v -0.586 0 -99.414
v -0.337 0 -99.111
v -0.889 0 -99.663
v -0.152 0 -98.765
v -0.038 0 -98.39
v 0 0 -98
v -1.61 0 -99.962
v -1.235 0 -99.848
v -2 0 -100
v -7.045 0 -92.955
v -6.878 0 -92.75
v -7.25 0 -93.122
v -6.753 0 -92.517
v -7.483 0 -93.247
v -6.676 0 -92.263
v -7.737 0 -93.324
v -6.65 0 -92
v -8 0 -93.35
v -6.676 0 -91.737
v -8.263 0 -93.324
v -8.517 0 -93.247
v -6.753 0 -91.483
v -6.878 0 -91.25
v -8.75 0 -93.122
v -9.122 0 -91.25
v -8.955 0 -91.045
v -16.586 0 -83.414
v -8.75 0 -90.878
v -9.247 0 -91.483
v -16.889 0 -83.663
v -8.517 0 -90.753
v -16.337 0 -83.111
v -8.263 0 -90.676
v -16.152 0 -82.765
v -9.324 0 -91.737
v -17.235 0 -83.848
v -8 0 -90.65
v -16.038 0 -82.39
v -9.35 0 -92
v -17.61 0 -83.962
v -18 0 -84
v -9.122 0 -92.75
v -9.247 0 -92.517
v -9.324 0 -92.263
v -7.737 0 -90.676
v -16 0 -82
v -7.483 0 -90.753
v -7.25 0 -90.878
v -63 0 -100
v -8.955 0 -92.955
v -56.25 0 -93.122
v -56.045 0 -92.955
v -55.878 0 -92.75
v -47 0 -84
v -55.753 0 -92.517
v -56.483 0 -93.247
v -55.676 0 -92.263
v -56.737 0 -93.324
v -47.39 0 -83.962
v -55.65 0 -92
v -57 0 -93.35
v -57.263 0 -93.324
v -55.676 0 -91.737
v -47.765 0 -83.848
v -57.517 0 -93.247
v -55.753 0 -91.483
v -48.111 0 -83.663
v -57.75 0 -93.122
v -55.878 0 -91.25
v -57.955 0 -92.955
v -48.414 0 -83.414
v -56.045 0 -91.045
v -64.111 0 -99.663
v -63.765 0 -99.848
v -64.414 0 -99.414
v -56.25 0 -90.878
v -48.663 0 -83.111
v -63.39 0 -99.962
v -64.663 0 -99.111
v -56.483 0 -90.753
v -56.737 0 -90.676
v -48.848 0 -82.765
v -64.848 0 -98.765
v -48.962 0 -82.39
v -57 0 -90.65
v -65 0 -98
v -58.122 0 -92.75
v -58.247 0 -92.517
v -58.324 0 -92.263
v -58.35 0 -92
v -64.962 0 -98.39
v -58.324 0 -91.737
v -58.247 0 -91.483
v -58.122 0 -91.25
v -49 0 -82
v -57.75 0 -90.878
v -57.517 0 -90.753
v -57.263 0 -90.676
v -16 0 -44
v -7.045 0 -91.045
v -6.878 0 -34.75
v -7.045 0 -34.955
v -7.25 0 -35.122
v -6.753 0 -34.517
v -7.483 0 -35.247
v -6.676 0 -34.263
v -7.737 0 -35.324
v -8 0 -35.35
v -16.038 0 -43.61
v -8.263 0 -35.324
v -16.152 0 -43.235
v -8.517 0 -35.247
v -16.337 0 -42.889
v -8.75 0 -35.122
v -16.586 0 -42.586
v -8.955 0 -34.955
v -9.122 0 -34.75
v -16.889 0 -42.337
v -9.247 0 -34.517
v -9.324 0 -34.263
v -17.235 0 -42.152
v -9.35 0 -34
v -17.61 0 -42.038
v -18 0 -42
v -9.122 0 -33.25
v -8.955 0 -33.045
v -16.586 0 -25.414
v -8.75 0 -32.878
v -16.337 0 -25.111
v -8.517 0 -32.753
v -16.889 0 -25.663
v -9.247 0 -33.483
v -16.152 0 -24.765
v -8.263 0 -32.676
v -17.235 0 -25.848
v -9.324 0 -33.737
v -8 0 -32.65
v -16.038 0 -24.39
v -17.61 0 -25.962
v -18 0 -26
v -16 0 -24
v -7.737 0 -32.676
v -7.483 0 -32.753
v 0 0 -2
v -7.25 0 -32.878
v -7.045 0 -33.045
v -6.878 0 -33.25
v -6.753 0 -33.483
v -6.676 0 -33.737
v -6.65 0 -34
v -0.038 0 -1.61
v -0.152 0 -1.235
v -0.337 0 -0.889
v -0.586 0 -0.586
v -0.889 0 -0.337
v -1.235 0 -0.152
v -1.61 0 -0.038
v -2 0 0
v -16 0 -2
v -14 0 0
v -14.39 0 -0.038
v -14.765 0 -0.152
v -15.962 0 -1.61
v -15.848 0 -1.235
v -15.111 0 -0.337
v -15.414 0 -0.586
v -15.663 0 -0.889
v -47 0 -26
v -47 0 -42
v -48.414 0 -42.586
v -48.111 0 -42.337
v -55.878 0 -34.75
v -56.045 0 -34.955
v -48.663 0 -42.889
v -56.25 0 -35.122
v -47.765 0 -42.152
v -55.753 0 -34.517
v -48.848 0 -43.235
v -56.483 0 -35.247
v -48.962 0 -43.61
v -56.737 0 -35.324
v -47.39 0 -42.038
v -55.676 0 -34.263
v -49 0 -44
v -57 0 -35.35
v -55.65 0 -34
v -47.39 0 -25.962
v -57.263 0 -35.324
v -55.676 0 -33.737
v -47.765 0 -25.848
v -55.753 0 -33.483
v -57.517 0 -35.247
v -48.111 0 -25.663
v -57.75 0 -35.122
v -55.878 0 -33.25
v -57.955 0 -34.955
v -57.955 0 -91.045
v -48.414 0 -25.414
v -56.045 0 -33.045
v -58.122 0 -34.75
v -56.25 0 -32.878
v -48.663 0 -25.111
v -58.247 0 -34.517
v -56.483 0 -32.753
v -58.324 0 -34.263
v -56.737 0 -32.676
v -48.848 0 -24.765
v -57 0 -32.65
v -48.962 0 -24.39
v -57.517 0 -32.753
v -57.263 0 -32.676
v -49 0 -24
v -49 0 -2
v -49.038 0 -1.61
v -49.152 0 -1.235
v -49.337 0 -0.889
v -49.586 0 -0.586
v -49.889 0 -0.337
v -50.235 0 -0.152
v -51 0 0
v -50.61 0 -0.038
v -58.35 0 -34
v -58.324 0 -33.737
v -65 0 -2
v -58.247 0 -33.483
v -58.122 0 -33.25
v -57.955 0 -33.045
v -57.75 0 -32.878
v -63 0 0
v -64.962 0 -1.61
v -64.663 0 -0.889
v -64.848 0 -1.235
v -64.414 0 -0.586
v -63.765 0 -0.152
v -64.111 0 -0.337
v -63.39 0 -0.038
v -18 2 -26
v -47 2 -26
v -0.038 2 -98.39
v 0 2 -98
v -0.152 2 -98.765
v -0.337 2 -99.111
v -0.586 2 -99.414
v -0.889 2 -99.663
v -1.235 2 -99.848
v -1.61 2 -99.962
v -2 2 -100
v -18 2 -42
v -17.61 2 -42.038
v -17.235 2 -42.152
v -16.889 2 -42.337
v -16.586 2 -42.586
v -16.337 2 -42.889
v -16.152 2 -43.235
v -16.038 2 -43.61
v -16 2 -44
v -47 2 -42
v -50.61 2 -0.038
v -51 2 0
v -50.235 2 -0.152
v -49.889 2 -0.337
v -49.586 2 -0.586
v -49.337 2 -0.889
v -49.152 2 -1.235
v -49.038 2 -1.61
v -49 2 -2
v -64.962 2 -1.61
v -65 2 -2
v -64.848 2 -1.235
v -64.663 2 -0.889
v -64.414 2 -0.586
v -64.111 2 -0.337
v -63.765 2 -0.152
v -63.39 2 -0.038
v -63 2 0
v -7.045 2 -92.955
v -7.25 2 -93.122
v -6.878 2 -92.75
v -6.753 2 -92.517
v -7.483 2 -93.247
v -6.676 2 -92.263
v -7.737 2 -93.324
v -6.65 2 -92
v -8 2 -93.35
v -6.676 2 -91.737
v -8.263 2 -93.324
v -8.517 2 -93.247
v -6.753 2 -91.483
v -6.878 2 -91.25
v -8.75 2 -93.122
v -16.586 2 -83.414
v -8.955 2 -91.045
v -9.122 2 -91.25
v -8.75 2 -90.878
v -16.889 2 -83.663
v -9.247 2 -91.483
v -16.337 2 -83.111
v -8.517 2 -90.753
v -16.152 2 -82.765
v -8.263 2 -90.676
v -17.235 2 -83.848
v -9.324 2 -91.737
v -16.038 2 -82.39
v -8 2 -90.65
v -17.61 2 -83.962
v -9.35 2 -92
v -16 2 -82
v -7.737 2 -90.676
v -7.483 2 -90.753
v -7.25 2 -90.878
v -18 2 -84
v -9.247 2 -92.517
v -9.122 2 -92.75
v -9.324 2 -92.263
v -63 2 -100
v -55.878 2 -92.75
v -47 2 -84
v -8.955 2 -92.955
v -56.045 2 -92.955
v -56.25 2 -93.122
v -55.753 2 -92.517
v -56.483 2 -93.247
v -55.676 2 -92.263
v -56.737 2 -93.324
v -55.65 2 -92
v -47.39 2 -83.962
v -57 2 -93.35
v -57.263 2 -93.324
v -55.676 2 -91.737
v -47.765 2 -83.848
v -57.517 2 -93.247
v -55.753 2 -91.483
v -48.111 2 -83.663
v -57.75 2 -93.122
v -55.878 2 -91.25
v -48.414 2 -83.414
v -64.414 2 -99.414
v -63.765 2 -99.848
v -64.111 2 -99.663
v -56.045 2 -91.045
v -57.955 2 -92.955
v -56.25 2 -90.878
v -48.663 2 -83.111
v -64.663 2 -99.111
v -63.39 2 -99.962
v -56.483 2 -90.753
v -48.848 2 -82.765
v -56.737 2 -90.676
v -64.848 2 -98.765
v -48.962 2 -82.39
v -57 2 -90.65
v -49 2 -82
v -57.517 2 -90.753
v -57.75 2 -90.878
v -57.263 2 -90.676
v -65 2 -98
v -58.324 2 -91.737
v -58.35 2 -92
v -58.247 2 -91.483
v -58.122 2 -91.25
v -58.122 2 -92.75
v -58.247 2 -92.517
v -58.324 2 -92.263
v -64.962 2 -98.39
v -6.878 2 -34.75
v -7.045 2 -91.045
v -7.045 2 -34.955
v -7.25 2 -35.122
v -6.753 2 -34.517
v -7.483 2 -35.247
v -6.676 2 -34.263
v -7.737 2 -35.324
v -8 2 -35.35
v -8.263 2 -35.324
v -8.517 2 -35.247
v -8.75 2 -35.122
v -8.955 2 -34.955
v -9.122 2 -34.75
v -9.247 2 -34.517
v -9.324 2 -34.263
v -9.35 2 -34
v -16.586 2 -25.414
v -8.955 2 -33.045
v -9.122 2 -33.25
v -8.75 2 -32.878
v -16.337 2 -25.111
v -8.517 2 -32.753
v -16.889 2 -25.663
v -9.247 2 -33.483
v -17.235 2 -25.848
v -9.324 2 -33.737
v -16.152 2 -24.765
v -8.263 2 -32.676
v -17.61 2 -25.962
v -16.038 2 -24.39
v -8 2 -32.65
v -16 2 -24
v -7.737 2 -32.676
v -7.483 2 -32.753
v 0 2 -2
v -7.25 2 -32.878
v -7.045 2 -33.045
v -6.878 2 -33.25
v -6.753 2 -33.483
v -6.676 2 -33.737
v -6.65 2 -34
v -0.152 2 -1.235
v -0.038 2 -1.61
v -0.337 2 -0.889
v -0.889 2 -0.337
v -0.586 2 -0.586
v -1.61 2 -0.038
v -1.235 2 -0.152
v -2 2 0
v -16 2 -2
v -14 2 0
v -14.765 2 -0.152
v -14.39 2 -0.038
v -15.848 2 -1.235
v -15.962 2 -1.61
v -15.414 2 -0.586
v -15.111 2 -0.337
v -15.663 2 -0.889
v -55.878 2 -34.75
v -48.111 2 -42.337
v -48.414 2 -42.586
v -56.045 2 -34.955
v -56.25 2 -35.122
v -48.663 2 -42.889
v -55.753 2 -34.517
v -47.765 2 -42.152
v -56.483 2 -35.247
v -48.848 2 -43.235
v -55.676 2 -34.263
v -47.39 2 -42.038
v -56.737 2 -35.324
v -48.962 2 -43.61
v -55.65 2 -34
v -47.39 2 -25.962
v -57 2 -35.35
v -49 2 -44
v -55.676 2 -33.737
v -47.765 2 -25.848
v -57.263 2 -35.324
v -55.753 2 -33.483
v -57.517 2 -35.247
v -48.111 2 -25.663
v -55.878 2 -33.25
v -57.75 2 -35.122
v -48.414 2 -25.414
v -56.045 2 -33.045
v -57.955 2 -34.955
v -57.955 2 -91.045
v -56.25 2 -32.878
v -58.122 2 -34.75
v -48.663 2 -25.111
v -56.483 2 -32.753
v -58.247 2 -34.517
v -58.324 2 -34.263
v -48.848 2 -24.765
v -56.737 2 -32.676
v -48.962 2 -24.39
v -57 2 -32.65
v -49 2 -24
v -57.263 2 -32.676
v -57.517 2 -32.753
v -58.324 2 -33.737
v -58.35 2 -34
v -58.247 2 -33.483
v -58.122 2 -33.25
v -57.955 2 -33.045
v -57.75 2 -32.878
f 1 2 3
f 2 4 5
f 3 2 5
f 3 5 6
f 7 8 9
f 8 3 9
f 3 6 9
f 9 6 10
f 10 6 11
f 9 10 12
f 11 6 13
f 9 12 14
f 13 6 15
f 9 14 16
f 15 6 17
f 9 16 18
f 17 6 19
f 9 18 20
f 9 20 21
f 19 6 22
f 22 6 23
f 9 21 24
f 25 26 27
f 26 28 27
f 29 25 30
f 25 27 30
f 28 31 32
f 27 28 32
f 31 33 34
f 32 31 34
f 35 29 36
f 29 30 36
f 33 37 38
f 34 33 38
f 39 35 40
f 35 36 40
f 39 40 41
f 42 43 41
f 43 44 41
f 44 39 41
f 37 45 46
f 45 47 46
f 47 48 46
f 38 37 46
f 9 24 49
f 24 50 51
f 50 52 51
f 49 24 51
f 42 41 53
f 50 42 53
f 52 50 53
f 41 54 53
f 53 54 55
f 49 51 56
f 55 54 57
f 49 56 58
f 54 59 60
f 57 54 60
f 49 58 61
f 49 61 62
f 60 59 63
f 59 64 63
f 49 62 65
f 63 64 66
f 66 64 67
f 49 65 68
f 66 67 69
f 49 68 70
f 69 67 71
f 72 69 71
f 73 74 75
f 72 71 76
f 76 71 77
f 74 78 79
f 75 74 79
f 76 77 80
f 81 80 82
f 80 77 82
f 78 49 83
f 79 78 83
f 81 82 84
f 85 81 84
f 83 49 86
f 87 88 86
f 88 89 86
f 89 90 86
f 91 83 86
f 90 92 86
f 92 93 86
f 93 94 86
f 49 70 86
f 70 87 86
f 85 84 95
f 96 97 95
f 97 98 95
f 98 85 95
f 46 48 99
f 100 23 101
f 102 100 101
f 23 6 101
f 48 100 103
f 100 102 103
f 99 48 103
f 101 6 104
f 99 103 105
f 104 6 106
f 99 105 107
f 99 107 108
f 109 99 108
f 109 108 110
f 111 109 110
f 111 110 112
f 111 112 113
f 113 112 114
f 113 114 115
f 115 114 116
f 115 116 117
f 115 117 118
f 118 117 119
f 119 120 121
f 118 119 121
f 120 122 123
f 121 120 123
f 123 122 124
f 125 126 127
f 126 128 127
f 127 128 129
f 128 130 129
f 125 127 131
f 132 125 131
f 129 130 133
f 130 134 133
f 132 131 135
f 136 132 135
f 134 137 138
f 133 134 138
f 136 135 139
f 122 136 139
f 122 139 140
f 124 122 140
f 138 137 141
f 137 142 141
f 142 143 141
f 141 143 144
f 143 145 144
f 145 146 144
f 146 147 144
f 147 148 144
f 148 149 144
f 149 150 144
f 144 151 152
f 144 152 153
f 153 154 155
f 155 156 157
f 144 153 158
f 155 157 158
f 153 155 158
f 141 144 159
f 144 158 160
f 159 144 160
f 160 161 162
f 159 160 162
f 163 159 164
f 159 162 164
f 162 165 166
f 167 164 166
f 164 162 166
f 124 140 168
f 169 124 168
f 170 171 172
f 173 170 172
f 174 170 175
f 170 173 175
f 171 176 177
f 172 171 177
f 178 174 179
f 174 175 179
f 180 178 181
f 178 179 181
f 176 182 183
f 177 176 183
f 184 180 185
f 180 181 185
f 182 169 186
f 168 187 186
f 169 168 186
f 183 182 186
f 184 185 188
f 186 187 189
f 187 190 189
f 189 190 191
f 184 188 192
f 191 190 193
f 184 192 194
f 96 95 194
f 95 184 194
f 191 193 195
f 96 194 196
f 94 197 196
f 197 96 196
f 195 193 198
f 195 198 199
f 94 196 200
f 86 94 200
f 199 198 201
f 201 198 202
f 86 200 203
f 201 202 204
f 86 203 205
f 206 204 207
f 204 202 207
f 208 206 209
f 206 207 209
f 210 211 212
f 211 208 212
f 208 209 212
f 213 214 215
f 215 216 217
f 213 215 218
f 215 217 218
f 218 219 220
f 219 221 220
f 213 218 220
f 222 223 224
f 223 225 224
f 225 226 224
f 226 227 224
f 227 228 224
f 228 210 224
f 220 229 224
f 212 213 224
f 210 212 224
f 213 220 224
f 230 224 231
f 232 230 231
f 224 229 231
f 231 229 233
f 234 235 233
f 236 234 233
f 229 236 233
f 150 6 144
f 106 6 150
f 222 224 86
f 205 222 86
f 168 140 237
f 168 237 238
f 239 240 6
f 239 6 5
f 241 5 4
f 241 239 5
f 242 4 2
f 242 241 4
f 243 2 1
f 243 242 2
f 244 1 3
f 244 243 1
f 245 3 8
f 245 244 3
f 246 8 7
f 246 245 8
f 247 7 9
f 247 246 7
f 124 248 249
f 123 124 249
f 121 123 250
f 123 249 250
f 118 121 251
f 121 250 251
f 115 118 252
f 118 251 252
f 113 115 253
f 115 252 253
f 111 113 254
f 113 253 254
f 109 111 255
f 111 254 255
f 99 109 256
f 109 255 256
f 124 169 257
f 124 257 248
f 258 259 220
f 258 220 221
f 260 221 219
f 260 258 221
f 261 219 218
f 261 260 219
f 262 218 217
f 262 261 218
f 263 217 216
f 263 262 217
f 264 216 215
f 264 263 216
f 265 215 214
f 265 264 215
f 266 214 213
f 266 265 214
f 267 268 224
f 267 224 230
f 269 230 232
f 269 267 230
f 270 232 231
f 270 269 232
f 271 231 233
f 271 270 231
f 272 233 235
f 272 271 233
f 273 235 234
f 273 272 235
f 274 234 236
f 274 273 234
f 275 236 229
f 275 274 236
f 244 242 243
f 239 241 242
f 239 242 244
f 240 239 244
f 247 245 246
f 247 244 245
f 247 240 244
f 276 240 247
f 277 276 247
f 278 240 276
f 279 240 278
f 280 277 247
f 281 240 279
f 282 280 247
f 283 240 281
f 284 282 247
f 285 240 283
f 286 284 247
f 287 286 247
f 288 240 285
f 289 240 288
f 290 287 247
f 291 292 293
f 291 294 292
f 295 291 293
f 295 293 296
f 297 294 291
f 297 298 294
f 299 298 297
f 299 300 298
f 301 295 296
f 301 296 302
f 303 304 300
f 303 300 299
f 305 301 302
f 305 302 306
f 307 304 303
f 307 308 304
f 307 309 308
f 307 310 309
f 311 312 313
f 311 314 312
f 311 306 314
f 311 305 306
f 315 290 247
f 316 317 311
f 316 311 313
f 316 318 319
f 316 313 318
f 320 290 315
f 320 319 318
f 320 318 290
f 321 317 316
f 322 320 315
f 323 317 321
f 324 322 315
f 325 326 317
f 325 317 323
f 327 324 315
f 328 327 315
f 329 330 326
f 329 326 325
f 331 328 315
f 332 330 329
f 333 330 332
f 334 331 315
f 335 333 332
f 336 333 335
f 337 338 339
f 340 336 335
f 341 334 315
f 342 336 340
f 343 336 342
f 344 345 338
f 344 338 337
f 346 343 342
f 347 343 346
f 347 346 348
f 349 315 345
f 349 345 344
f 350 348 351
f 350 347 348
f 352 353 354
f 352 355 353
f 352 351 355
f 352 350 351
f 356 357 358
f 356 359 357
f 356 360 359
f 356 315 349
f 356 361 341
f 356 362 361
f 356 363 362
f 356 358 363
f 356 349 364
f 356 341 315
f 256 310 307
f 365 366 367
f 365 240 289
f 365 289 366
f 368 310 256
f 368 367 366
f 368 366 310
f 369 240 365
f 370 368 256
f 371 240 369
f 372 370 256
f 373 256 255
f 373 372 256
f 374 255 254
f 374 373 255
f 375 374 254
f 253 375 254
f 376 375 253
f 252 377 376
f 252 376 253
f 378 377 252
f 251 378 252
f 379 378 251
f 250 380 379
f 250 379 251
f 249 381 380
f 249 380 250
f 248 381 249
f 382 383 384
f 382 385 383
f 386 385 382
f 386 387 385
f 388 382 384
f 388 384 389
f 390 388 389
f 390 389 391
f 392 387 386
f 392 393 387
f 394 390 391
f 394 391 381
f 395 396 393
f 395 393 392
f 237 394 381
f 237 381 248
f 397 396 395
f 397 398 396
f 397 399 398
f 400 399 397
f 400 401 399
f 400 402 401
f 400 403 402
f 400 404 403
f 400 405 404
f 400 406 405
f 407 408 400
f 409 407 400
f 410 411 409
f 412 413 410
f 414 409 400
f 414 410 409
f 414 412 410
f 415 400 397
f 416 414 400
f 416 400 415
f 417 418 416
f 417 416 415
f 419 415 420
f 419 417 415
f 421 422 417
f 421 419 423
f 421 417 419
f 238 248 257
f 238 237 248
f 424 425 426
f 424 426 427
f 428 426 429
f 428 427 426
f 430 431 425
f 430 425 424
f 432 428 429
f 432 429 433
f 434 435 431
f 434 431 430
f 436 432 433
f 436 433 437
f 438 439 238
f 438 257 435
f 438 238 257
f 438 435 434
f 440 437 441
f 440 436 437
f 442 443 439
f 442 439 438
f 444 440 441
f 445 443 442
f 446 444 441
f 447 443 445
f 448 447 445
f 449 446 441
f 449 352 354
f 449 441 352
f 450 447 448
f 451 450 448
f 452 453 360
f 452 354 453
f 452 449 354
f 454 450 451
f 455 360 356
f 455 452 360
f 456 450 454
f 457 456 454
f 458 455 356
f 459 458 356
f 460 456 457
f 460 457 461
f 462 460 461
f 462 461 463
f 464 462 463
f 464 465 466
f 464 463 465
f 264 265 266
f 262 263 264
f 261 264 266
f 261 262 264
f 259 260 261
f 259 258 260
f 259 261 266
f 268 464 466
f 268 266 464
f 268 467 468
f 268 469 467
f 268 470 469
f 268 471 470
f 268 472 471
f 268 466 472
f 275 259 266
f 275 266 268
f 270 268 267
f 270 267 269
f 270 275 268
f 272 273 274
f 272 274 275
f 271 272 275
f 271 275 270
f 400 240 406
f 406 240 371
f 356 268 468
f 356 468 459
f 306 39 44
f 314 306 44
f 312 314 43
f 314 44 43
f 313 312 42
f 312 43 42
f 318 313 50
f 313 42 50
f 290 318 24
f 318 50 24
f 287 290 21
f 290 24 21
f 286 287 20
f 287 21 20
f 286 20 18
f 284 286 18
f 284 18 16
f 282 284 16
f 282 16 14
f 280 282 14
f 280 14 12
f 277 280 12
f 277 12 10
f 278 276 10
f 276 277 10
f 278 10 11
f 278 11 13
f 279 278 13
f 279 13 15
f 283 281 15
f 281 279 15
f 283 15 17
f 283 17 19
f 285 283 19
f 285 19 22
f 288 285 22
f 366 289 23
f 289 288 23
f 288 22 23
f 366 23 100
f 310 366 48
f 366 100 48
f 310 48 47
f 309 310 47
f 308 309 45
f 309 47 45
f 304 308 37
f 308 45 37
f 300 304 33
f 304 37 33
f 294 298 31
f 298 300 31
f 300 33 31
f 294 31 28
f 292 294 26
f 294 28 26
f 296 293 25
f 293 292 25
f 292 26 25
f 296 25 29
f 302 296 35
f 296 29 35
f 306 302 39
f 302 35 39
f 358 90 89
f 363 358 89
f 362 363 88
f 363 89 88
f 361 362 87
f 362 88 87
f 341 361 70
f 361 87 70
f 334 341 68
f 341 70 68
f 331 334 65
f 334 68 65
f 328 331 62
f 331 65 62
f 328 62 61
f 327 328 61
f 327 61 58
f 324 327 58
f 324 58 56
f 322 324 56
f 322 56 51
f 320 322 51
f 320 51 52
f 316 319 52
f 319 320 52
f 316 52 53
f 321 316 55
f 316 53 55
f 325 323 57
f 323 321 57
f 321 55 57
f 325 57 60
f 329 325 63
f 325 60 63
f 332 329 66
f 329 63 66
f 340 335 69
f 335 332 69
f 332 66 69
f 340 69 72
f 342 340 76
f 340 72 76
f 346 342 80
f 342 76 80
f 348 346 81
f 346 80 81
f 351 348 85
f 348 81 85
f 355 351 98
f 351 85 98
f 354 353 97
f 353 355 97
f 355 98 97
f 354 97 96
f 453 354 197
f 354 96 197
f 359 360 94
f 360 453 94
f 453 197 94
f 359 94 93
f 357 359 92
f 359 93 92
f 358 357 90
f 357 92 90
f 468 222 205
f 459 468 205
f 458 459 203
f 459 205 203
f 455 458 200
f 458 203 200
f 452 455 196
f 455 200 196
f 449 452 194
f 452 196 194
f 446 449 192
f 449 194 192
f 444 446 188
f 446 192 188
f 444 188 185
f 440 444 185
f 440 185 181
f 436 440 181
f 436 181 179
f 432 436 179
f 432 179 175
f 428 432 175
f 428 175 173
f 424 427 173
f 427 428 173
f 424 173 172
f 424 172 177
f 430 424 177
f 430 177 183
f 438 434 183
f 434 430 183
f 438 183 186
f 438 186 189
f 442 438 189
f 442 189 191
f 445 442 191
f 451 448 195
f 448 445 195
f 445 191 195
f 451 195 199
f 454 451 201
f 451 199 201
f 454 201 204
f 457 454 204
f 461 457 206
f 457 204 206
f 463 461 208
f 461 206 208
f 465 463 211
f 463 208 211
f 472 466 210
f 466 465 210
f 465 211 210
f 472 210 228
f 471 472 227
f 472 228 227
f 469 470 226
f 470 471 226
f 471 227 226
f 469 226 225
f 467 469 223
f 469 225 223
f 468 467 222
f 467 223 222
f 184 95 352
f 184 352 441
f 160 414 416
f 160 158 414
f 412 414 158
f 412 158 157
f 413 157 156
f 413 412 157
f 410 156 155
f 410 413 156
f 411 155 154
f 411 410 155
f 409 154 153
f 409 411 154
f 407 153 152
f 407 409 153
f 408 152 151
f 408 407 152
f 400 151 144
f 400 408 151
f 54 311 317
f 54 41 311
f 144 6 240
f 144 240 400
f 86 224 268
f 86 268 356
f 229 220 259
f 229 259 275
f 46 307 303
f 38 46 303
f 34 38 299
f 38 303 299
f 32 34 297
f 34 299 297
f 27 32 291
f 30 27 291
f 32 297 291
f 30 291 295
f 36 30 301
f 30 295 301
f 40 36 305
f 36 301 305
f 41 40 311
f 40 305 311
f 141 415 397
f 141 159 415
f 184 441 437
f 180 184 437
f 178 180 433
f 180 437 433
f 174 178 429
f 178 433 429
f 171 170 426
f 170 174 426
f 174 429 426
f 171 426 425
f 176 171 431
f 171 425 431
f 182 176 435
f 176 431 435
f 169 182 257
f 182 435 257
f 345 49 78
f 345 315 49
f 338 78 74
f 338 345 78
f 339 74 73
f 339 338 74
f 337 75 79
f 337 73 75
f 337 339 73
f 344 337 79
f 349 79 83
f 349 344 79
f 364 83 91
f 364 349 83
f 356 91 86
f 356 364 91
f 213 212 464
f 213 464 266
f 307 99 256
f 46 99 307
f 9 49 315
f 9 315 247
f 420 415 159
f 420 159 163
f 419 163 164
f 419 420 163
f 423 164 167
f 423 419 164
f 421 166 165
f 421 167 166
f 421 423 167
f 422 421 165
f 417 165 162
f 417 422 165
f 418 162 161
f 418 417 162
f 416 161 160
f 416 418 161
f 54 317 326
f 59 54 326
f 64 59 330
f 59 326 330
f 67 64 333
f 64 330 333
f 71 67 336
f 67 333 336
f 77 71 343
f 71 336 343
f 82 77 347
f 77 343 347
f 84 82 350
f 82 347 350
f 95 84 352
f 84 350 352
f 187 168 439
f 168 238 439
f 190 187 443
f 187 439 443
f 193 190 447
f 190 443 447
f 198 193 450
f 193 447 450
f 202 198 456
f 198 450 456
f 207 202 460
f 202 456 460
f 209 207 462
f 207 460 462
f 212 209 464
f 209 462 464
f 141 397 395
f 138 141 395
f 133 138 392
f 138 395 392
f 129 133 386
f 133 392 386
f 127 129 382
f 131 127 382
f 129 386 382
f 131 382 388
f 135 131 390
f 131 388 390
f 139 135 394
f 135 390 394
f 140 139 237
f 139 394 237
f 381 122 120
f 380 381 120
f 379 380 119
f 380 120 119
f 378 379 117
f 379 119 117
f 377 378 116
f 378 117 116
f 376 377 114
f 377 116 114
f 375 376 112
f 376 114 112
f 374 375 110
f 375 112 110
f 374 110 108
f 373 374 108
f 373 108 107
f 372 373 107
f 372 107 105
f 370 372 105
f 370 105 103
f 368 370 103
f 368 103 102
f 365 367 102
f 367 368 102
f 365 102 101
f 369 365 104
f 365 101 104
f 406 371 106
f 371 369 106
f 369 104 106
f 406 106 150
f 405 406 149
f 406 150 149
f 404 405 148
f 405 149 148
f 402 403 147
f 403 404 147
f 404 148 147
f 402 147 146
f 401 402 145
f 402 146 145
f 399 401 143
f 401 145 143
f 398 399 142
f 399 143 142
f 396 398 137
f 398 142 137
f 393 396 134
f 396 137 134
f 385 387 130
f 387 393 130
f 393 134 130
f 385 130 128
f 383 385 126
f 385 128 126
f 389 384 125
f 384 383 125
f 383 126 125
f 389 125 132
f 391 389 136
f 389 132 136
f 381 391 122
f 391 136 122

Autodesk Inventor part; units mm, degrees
ref_plane "YZ Plane" through (0, 0, 0) normal (1, 0, 0) x (0, 1, 0)
ref_plane "XZ Plane" through (0, 0, 0) normal (0, 1, 0) x (-1, 0, 0)
ref_plane "XY Plane" through (0, 0, 0) normal (0, 0, 1) x (1, 0, 0)
sketch "Sketch1" plane through (0, 0, 0) normal (0, 1, 0) x (-1, 0, 0)
  line L0 (65, 0) -> (65, -100)
  line L1 (65, -100) -> (0, -100)
  line L2 (0, -100) -> (0, 0)
  line L3 (8, -34) -> (57, -34) construction
  line L4 (57, -34) -> (57, -92) construction
  line L5 (57, -92) -> (8, -92) construction
  line L6 (8, -92) -> (8, -34) construction
  circle A0 centre (57, -34) radius 1.35
  circle A1 centre (57, -92) radius 1.35
  circle A2 centre (8, -34) radius 1.35
  circle A3 centre (8, -92) radius 1.35
  line L7 (49, -42) -> (16, -42)
  line L8 (16, -42) -> (16, -84)
  line L9 (16, -84) -> (49, -84)
  line L10 (49, -84) -> (49, -42)
  line L11 (49, 0) -> (16, 0) construction
  line L12 (16, 0) -> (16, -26)
  line L13 (16, -26) -> (49, -26)
  line L14 (49, -26) -> (49, 0)
  line L15 (0, 0) -> (16, 0)
  line L16 (49, 0) -> (65, 0)
  point P0 (32.5, -34)
  dimension "d0" = 49
  dimension "d1" = 58
  dimension "d2" = 2.7
  dimension "d3" = 100
  dimension "d4" = 65
  dimension "d5" = 8
  dimension "d7" = 8
  dimension "d8" = 8
  dimension "d9" = 8
  dimension "d10" = 8
  dimension "d11" = 8
  dimension "d15" = 8
extrude "Extrusion1" add sketch "Sketch1" along normal blind 2
fillet "Fillet1" radius 2 12 edges at (-49, 1, -84) (-49, 1, -42) (-16, 1, -42) (-16, 1, -84) (-65, 1, -100) (0, 1, -100) (0, 1, 0) (-65, 1, 0) (-49, 1, 0) (-49, 1, -26) (-16, 1, -26) (-16, 1, 0)
equation "\"d5\" = -0.5 * d0 + 0.5 * d4"
equation "\"d7\" = d5"
equation "\"d8\" = d5"
equation "\"d9\" = d5"
equation "\"d10\" = d5"
equation "\"d11\" = d5"
equation "\"d15\" = d5"
properties part number "targetpart"
